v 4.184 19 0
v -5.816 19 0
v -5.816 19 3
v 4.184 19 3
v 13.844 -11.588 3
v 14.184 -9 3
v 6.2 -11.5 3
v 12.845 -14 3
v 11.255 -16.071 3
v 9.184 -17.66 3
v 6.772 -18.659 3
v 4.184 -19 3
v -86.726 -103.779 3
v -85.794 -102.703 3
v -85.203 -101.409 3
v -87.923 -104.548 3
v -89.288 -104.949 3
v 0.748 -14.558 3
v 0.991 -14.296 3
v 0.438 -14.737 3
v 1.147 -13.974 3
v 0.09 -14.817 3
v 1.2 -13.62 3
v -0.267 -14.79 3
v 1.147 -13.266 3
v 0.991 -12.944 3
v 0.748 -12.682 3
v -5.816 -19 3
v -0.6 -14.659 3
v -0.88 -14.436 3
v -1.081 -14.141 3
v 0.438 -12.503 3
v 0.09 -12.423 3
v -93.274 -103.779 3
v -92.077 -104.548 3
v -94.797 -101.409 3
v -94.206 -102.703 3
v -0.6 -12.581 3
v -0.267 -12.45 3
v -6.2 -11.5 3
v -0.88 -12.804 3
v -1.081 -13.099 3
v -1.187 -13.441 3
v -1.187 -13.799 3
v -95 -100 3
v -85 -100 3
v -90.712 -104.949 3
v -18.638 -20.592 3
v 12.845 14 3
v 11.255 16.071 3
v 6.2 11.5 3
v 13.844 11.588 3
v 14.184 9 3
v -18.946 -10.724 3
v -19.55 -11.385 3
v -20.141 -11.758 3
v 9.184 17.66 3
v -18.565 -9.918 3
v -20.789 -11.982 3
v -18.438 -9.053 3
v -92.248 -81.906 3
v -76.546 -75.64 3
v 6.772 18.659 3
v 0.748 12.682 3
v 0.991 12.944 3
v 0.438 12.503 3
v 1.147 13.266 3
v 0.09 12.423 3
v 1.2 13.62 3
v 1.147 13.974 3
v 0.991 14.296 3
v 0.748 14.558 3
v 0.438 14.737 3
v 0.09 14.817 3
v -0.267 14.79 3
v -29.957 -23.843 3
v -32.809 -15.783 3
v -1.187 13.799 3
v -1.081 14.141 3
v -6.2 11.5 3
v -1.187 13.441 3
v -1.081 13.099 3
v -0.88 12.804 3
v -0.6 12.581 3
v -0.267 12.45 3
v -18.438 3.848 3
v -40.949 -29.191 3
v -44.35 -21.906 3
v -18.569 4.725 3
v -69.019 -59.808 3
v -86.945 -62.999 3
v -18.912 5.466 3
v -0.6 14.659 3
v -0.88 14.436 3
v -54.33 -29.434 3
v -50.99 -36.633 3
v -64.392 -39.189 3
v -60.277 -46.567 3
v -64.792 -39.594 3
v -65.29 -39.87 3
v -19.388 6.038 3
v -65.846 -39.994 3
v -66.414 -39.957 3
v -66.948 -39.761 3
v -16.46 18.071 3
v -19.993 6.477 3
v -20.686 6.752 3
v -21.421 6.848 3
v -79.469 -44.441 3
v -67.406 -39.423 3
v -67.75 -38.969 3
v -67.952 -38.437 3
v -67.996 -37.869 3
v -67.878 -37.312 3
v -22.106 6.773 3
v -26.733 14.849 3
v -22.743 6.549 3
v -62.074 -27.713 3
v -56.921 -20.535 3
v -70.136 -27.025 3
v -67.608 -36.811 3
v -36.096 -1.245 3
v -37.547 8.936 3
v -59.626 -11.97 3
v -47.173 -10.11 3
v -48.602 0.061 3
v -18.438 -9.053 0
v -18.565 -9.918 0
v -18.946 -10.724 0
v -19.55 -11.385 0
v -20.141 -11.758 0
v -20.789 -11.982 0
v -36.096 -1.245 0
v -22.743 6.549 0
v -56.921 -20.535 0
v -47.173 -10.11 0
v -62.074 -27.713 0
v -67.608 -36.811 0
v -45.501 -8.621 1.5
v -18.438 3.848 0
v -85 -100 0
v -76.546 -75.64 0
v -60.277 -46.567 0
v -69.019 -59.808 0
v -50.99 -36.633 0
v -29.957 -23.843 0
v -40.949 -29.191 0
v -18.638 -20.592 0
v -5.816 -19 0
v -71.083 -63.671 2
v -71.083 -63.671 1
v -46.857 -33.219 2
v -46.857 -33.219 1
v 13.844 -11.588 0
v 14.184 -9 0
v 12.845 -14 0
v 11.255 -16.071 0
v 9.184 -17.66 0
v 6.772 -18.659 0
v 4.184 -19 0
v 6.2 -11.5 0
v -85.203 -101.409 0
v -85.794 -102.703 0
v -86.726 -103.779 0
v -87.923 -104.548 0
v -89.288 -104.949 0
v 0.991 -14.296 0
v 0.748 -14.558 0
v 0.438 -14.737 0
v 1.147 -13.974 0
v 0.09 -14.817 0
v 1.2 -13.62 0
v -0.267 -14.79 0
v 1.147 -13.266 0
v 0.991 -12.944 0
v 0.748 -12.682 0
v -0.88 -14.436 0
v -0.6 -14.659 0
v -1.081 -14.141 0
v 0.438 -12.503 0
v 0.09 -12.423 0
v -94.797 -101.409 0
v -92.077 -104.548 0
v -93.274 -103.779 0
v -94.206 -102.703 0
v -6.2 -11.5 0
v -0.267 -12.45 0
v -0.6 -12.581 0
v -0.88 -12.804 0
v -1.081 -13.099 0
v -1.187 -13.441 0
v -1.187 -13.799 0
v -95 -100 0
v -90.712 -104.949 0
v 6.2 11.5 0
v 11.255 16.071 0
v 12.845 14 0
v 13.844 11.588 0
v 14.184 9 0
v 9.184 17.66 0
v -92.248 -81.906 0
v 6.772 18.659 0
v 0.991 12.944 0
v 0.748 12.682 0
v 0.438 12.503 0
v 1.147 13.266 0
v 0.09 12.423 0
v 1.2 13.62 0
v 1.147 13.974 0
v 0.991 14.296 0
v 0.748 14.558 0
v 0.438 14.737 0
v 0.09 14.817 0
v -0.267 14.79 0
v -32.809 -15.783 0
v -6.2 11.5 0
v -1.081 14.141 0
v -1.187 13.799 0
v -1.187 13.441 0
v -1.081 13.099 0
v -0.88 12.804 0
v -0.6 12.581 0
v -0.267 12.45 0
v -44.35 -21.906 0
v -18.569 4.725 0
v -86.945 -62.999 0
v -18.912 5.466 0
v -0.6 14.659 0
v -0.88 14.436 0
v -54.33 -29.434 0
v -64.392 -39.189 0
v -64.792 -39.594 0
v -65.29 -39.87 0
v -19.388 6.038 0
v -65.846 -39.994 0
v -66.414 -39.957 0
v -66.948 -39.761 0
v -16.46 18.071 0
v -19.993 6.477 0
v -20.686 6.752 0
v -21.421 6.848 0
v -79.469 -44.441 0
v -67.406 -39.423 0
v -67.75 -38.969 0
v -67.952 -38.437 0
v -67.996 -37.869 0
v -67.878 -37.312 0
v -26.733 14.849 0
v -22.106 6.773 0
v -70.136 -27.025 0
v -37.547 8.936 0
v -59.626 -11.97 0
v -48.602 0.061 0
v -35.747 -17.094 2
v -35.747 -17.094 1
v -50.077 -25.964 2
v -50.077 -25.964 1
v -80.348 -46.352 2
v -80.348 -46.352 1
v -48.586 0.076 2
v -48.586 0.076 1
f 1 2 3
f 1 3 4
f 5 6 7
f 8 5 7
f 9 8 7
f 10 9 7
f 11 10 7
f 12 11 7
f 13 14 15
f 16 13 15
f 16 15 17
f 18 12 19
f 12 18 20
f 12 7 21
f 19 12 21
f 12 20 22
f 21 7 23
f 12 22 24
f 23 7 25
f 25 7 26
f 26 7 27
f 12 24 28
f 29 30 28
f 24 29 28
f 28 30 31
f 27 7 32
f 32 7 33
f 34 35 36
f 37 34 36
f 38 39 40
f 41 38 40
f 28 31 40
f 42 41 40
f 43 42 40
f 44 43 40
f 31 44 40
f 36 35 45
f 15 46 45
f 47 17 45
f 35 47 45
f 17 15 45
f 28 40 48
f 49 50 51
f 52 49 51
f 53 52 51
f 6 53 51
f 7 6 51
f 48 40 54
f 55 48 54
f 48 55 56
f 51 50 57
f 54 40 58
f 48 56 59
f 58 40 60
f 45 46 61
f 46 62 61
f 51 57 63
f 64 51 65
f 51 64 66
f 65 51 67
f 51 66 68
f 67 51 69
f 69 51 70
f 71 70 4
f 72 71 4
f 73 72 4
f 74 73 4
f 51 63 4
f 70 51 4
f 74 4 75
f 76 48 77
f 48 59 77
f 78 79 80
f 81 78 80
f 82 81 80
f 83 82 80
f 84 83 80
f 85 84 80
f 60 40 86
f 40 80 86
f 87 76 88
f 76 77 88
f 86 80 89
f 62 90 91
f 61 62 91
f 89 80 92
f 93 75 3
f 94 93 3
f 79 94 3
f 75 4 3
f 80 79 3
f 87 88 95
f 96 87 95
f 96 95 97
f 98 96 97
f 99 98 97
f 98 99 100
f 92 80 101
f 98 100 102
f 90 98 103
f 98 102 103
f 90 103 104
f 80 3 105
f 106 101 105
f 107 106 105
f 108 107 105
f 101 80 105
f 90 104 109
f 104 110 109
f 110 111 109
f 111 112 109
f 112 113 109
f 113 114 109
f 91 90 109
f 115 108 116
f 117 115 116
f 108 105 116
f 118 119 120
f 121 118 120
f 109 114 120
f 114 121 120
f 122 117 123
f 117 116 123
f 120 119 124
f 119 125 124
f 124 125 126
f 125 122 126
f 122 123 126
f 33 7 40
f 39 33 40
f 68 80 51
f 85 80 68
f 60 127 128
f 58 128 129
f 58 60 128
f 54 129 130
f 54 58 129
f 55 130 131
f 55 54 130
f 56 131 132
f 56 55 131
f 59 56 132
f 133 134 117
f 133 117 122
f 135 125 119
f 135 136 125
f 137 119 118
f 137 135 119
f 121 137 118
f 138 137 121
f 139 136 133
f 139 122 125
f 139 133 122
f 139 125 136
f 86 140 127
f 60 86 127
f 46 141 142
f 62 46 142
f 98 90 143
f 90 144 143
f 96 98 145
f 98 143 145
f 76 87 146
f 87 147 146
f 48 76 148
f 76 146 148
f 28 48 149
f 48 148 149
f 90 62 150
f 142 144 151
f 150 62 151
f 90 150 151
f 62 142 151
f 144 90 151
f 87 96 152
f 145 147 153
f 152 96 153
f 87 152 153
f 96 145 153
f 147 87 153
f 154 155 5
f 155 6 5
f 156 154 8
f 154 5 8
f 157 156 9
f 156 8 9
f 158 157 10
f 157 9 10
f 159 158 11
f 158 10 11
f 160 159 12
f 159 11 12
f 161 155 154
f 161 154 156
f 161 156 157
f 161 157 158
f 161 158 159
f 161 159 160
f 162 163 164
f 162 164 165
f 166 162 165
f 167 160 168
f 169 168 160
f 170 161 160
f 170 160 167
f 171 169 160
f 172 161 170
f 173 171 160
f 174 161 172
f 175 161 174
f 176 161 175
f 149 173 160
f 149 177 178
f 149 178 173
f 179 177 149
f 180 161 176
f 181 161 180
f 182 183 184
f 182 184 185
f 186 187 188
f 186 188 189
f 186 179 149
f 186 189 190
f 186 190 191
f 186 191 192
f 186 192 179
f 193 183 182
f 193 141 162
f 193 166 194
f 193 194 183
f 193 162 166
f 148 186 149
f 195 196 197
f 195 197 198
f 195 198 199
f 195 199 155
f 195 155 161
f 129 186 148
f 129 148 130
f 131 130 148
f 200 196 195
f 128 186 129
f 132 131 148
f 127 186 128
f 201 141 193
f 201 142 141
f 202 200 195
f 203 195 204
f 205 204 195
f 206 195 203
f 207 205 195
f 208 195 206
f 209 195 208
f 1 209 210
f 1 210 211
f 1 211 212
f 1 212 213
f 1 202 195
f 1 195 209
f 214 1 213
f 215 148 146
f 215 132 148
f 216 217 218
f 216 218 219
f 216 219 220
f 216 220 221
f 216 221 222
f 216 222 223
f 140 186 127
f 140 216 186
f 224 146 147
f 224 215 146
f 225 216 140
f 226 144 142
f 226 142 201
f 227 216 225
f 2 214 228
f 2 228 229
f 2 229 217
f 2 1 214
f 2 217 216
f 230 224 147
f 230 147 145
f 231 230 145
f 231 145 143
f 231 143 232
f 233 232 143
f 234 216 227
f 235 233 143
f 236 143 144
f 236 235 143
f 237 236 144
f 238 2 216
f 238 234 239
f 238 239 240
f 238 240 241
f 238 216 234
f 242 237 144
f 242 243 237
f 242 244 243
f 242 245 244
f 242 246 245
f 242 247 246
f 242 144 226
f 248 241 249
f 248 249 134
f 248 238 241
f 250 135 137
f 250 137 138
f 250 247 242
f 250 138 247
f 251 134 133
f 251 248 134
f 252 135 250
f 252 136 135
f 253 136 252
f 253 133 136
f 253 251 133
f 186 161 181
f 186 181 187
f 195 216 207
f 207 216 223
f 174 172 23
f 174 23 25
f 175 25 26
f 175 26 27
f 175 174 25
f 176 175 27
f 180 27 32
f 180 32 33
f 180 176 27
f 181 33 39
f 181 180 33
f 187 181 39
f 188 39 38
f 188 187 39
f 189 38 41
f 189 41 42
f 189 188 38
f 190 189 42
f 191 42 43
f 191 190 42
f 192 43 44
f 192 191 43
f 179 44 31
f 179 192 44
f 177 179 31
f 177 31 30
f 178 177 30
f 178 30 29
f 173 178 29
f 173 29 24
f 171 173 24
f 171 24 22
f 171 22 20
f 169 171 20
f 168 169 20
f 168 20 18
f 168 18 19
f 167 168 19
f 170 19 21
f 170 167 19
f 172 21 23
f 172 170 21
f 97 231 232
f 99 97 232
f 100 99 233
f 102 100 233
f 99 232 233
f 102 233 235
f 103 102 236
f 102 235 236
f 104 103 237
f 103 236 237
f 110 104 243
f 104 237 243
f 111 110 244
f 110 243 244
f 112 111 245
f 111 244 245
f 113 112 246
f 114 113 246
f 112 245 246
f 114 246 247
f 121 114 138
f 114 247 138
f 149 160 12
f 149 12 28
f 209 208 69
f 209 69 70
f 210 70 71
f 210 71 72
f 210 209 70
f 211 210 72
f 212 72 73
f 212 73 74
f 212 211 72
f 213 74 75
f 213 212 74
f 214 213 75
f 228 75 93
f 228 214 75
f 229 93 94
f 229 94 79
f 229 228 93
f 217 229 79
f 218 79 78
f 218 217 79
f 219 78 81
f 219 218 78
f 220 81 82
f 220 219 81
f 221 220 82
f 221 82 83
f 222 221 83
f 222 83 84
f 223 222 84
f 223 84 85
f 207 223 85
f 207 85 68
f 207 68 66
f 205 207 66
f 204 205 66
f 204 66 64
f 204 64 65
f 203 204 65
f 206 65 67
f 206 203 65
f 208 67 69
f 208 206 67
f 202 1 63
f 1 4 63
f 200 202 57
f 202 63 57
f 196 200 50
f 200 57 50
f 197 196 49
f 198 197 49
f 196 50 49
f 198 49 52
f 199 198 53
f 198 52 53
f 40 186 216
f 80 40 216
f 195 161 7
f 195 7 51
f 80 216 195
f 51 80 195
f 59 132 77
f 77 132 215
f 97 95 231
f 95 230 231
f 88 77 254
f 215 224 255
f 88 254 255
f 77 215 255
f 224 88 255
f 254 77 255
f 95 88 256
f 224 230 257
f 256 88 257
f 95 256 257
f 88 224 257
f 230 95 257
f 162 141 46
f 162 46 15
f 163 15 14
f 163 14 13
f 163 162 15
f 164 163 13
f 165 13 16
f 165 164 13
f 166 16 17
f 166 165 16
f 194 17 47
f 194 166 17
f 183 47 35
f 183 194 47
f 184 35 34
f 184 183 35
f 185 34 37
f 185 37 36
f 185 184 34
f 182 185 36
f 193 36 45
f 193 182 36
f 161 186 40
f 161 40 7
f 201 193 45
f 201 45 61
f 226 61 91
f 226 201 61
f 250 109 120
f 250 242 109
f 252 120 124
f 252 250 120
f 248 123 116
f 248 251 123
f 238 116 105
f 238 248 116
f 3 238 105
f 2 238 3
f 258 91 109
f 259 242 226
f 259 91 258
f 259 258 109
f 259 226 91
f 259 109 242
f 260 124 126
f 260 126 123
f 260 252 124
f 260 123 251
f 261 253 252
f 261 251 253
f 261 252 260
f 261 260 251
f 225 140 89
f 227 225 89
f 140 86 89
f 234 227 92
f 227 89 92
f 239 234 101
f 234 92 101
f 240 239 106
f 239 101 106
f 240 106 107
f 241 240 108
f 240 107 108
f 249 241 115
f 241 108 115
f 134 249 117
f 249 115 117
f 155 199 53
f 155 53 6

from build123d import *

# Parameters (mm, degrees)
SKETCH_R    = 1.2
SKETCH_W    = 12.4
SKETCH_H    = 23
PAD_DEPTH   = 3
FILLET_R    = 10
FILLET001_R = 3


with BuildPart() as part:
    # Sketch → Pad (new body)
    with BuildSketch(Plane.XY):
        with BuildLine():
            add(Edge.make_bspline(
                [(-95, -100), (-90.935824, -49.378152), (-52.268879, 20.279381), (-5.815751, 19)],
                knots=[0, 0, 0, 0, 1, 1, 1, 1], degree=3, weights=[6, 5.94, 6, 6]))
            Line((-5.815751, 19), (14.184249, 19))
            Line((14.184249, 19), (14.184249, -19))
            Line((14.184249, -19), (-5.815751, -19))
            add(Edge.make_bspline(
                [(-85, -100), (-74.069861, -64.186531), (-57.431784, -21.648657), (-5.815751, -19)],
                knots=[0, 0, 0, 0, 1, 1, 1, 1], degree=3))
            ThreePointArc((-85, -100), (-90, -105), (-95, -100))
        make_face()
        with Locations((0, 13.62)):
            Circle(SKETCH_R, mode=Mode.SUBTRACT)
        with Locations((0, -13.62)):
            Circle(SKETCH_R, mode=Mode.SUBTRACT)
        Rectangle(SKETCH_W, SKETCH_H, mode=Mode.SUBTRACT)
        with BuildLine():
            Line((-18.437941, 8.511872), (-18.437941, -11.5))
            add(Edge.make_bspline(
                [(-18.437941, -11.5), (-34.8974, -14.6095), (-49.1502, -22.8021), (-64.391878, -39.189094)],
                knots=[0, 0, 0, 0, 1, 1, 1, 1], degree=3))
            ThreePointArc((-64.391878, -39.189094), (-67.189094, -39.608122), (-67.608122, -36.810906))
            add(Edge.make_bspline(
                [(-18.437941, 8.511872), (-29.646872, 3.697302), (-46.497875, -7.962993), (-59.361809, -22.256252), (-67.608122, -36.810906)],
                knots=[0, 0, 0, 0, 0.5, 1, 1, 1, 1], degree=3))
        make_face(mode=Mode.SUBTRACT)
    extrude(amount=PAD_DEPTH)

    # Fillet
    fillet_edges = [part.edges().sort_by_distance(p)[0] for p in [
        (14.184249, -19, 1.5),
        (14.184249, 19, 1.5),
    ]]
    fillet(fillet_edges, radius=FILLET_R)

    # Fillet001
    fillet001_edges = [part.edges().sort_by_distance(p)[0] for p in [
        (-18.437941, 8.511872, 1.5),
        (-18.437941, -11.5, 1.5),
    ]]
    fillet(fillet001_edges, radius=FILLET001_R)


solid = part.part
